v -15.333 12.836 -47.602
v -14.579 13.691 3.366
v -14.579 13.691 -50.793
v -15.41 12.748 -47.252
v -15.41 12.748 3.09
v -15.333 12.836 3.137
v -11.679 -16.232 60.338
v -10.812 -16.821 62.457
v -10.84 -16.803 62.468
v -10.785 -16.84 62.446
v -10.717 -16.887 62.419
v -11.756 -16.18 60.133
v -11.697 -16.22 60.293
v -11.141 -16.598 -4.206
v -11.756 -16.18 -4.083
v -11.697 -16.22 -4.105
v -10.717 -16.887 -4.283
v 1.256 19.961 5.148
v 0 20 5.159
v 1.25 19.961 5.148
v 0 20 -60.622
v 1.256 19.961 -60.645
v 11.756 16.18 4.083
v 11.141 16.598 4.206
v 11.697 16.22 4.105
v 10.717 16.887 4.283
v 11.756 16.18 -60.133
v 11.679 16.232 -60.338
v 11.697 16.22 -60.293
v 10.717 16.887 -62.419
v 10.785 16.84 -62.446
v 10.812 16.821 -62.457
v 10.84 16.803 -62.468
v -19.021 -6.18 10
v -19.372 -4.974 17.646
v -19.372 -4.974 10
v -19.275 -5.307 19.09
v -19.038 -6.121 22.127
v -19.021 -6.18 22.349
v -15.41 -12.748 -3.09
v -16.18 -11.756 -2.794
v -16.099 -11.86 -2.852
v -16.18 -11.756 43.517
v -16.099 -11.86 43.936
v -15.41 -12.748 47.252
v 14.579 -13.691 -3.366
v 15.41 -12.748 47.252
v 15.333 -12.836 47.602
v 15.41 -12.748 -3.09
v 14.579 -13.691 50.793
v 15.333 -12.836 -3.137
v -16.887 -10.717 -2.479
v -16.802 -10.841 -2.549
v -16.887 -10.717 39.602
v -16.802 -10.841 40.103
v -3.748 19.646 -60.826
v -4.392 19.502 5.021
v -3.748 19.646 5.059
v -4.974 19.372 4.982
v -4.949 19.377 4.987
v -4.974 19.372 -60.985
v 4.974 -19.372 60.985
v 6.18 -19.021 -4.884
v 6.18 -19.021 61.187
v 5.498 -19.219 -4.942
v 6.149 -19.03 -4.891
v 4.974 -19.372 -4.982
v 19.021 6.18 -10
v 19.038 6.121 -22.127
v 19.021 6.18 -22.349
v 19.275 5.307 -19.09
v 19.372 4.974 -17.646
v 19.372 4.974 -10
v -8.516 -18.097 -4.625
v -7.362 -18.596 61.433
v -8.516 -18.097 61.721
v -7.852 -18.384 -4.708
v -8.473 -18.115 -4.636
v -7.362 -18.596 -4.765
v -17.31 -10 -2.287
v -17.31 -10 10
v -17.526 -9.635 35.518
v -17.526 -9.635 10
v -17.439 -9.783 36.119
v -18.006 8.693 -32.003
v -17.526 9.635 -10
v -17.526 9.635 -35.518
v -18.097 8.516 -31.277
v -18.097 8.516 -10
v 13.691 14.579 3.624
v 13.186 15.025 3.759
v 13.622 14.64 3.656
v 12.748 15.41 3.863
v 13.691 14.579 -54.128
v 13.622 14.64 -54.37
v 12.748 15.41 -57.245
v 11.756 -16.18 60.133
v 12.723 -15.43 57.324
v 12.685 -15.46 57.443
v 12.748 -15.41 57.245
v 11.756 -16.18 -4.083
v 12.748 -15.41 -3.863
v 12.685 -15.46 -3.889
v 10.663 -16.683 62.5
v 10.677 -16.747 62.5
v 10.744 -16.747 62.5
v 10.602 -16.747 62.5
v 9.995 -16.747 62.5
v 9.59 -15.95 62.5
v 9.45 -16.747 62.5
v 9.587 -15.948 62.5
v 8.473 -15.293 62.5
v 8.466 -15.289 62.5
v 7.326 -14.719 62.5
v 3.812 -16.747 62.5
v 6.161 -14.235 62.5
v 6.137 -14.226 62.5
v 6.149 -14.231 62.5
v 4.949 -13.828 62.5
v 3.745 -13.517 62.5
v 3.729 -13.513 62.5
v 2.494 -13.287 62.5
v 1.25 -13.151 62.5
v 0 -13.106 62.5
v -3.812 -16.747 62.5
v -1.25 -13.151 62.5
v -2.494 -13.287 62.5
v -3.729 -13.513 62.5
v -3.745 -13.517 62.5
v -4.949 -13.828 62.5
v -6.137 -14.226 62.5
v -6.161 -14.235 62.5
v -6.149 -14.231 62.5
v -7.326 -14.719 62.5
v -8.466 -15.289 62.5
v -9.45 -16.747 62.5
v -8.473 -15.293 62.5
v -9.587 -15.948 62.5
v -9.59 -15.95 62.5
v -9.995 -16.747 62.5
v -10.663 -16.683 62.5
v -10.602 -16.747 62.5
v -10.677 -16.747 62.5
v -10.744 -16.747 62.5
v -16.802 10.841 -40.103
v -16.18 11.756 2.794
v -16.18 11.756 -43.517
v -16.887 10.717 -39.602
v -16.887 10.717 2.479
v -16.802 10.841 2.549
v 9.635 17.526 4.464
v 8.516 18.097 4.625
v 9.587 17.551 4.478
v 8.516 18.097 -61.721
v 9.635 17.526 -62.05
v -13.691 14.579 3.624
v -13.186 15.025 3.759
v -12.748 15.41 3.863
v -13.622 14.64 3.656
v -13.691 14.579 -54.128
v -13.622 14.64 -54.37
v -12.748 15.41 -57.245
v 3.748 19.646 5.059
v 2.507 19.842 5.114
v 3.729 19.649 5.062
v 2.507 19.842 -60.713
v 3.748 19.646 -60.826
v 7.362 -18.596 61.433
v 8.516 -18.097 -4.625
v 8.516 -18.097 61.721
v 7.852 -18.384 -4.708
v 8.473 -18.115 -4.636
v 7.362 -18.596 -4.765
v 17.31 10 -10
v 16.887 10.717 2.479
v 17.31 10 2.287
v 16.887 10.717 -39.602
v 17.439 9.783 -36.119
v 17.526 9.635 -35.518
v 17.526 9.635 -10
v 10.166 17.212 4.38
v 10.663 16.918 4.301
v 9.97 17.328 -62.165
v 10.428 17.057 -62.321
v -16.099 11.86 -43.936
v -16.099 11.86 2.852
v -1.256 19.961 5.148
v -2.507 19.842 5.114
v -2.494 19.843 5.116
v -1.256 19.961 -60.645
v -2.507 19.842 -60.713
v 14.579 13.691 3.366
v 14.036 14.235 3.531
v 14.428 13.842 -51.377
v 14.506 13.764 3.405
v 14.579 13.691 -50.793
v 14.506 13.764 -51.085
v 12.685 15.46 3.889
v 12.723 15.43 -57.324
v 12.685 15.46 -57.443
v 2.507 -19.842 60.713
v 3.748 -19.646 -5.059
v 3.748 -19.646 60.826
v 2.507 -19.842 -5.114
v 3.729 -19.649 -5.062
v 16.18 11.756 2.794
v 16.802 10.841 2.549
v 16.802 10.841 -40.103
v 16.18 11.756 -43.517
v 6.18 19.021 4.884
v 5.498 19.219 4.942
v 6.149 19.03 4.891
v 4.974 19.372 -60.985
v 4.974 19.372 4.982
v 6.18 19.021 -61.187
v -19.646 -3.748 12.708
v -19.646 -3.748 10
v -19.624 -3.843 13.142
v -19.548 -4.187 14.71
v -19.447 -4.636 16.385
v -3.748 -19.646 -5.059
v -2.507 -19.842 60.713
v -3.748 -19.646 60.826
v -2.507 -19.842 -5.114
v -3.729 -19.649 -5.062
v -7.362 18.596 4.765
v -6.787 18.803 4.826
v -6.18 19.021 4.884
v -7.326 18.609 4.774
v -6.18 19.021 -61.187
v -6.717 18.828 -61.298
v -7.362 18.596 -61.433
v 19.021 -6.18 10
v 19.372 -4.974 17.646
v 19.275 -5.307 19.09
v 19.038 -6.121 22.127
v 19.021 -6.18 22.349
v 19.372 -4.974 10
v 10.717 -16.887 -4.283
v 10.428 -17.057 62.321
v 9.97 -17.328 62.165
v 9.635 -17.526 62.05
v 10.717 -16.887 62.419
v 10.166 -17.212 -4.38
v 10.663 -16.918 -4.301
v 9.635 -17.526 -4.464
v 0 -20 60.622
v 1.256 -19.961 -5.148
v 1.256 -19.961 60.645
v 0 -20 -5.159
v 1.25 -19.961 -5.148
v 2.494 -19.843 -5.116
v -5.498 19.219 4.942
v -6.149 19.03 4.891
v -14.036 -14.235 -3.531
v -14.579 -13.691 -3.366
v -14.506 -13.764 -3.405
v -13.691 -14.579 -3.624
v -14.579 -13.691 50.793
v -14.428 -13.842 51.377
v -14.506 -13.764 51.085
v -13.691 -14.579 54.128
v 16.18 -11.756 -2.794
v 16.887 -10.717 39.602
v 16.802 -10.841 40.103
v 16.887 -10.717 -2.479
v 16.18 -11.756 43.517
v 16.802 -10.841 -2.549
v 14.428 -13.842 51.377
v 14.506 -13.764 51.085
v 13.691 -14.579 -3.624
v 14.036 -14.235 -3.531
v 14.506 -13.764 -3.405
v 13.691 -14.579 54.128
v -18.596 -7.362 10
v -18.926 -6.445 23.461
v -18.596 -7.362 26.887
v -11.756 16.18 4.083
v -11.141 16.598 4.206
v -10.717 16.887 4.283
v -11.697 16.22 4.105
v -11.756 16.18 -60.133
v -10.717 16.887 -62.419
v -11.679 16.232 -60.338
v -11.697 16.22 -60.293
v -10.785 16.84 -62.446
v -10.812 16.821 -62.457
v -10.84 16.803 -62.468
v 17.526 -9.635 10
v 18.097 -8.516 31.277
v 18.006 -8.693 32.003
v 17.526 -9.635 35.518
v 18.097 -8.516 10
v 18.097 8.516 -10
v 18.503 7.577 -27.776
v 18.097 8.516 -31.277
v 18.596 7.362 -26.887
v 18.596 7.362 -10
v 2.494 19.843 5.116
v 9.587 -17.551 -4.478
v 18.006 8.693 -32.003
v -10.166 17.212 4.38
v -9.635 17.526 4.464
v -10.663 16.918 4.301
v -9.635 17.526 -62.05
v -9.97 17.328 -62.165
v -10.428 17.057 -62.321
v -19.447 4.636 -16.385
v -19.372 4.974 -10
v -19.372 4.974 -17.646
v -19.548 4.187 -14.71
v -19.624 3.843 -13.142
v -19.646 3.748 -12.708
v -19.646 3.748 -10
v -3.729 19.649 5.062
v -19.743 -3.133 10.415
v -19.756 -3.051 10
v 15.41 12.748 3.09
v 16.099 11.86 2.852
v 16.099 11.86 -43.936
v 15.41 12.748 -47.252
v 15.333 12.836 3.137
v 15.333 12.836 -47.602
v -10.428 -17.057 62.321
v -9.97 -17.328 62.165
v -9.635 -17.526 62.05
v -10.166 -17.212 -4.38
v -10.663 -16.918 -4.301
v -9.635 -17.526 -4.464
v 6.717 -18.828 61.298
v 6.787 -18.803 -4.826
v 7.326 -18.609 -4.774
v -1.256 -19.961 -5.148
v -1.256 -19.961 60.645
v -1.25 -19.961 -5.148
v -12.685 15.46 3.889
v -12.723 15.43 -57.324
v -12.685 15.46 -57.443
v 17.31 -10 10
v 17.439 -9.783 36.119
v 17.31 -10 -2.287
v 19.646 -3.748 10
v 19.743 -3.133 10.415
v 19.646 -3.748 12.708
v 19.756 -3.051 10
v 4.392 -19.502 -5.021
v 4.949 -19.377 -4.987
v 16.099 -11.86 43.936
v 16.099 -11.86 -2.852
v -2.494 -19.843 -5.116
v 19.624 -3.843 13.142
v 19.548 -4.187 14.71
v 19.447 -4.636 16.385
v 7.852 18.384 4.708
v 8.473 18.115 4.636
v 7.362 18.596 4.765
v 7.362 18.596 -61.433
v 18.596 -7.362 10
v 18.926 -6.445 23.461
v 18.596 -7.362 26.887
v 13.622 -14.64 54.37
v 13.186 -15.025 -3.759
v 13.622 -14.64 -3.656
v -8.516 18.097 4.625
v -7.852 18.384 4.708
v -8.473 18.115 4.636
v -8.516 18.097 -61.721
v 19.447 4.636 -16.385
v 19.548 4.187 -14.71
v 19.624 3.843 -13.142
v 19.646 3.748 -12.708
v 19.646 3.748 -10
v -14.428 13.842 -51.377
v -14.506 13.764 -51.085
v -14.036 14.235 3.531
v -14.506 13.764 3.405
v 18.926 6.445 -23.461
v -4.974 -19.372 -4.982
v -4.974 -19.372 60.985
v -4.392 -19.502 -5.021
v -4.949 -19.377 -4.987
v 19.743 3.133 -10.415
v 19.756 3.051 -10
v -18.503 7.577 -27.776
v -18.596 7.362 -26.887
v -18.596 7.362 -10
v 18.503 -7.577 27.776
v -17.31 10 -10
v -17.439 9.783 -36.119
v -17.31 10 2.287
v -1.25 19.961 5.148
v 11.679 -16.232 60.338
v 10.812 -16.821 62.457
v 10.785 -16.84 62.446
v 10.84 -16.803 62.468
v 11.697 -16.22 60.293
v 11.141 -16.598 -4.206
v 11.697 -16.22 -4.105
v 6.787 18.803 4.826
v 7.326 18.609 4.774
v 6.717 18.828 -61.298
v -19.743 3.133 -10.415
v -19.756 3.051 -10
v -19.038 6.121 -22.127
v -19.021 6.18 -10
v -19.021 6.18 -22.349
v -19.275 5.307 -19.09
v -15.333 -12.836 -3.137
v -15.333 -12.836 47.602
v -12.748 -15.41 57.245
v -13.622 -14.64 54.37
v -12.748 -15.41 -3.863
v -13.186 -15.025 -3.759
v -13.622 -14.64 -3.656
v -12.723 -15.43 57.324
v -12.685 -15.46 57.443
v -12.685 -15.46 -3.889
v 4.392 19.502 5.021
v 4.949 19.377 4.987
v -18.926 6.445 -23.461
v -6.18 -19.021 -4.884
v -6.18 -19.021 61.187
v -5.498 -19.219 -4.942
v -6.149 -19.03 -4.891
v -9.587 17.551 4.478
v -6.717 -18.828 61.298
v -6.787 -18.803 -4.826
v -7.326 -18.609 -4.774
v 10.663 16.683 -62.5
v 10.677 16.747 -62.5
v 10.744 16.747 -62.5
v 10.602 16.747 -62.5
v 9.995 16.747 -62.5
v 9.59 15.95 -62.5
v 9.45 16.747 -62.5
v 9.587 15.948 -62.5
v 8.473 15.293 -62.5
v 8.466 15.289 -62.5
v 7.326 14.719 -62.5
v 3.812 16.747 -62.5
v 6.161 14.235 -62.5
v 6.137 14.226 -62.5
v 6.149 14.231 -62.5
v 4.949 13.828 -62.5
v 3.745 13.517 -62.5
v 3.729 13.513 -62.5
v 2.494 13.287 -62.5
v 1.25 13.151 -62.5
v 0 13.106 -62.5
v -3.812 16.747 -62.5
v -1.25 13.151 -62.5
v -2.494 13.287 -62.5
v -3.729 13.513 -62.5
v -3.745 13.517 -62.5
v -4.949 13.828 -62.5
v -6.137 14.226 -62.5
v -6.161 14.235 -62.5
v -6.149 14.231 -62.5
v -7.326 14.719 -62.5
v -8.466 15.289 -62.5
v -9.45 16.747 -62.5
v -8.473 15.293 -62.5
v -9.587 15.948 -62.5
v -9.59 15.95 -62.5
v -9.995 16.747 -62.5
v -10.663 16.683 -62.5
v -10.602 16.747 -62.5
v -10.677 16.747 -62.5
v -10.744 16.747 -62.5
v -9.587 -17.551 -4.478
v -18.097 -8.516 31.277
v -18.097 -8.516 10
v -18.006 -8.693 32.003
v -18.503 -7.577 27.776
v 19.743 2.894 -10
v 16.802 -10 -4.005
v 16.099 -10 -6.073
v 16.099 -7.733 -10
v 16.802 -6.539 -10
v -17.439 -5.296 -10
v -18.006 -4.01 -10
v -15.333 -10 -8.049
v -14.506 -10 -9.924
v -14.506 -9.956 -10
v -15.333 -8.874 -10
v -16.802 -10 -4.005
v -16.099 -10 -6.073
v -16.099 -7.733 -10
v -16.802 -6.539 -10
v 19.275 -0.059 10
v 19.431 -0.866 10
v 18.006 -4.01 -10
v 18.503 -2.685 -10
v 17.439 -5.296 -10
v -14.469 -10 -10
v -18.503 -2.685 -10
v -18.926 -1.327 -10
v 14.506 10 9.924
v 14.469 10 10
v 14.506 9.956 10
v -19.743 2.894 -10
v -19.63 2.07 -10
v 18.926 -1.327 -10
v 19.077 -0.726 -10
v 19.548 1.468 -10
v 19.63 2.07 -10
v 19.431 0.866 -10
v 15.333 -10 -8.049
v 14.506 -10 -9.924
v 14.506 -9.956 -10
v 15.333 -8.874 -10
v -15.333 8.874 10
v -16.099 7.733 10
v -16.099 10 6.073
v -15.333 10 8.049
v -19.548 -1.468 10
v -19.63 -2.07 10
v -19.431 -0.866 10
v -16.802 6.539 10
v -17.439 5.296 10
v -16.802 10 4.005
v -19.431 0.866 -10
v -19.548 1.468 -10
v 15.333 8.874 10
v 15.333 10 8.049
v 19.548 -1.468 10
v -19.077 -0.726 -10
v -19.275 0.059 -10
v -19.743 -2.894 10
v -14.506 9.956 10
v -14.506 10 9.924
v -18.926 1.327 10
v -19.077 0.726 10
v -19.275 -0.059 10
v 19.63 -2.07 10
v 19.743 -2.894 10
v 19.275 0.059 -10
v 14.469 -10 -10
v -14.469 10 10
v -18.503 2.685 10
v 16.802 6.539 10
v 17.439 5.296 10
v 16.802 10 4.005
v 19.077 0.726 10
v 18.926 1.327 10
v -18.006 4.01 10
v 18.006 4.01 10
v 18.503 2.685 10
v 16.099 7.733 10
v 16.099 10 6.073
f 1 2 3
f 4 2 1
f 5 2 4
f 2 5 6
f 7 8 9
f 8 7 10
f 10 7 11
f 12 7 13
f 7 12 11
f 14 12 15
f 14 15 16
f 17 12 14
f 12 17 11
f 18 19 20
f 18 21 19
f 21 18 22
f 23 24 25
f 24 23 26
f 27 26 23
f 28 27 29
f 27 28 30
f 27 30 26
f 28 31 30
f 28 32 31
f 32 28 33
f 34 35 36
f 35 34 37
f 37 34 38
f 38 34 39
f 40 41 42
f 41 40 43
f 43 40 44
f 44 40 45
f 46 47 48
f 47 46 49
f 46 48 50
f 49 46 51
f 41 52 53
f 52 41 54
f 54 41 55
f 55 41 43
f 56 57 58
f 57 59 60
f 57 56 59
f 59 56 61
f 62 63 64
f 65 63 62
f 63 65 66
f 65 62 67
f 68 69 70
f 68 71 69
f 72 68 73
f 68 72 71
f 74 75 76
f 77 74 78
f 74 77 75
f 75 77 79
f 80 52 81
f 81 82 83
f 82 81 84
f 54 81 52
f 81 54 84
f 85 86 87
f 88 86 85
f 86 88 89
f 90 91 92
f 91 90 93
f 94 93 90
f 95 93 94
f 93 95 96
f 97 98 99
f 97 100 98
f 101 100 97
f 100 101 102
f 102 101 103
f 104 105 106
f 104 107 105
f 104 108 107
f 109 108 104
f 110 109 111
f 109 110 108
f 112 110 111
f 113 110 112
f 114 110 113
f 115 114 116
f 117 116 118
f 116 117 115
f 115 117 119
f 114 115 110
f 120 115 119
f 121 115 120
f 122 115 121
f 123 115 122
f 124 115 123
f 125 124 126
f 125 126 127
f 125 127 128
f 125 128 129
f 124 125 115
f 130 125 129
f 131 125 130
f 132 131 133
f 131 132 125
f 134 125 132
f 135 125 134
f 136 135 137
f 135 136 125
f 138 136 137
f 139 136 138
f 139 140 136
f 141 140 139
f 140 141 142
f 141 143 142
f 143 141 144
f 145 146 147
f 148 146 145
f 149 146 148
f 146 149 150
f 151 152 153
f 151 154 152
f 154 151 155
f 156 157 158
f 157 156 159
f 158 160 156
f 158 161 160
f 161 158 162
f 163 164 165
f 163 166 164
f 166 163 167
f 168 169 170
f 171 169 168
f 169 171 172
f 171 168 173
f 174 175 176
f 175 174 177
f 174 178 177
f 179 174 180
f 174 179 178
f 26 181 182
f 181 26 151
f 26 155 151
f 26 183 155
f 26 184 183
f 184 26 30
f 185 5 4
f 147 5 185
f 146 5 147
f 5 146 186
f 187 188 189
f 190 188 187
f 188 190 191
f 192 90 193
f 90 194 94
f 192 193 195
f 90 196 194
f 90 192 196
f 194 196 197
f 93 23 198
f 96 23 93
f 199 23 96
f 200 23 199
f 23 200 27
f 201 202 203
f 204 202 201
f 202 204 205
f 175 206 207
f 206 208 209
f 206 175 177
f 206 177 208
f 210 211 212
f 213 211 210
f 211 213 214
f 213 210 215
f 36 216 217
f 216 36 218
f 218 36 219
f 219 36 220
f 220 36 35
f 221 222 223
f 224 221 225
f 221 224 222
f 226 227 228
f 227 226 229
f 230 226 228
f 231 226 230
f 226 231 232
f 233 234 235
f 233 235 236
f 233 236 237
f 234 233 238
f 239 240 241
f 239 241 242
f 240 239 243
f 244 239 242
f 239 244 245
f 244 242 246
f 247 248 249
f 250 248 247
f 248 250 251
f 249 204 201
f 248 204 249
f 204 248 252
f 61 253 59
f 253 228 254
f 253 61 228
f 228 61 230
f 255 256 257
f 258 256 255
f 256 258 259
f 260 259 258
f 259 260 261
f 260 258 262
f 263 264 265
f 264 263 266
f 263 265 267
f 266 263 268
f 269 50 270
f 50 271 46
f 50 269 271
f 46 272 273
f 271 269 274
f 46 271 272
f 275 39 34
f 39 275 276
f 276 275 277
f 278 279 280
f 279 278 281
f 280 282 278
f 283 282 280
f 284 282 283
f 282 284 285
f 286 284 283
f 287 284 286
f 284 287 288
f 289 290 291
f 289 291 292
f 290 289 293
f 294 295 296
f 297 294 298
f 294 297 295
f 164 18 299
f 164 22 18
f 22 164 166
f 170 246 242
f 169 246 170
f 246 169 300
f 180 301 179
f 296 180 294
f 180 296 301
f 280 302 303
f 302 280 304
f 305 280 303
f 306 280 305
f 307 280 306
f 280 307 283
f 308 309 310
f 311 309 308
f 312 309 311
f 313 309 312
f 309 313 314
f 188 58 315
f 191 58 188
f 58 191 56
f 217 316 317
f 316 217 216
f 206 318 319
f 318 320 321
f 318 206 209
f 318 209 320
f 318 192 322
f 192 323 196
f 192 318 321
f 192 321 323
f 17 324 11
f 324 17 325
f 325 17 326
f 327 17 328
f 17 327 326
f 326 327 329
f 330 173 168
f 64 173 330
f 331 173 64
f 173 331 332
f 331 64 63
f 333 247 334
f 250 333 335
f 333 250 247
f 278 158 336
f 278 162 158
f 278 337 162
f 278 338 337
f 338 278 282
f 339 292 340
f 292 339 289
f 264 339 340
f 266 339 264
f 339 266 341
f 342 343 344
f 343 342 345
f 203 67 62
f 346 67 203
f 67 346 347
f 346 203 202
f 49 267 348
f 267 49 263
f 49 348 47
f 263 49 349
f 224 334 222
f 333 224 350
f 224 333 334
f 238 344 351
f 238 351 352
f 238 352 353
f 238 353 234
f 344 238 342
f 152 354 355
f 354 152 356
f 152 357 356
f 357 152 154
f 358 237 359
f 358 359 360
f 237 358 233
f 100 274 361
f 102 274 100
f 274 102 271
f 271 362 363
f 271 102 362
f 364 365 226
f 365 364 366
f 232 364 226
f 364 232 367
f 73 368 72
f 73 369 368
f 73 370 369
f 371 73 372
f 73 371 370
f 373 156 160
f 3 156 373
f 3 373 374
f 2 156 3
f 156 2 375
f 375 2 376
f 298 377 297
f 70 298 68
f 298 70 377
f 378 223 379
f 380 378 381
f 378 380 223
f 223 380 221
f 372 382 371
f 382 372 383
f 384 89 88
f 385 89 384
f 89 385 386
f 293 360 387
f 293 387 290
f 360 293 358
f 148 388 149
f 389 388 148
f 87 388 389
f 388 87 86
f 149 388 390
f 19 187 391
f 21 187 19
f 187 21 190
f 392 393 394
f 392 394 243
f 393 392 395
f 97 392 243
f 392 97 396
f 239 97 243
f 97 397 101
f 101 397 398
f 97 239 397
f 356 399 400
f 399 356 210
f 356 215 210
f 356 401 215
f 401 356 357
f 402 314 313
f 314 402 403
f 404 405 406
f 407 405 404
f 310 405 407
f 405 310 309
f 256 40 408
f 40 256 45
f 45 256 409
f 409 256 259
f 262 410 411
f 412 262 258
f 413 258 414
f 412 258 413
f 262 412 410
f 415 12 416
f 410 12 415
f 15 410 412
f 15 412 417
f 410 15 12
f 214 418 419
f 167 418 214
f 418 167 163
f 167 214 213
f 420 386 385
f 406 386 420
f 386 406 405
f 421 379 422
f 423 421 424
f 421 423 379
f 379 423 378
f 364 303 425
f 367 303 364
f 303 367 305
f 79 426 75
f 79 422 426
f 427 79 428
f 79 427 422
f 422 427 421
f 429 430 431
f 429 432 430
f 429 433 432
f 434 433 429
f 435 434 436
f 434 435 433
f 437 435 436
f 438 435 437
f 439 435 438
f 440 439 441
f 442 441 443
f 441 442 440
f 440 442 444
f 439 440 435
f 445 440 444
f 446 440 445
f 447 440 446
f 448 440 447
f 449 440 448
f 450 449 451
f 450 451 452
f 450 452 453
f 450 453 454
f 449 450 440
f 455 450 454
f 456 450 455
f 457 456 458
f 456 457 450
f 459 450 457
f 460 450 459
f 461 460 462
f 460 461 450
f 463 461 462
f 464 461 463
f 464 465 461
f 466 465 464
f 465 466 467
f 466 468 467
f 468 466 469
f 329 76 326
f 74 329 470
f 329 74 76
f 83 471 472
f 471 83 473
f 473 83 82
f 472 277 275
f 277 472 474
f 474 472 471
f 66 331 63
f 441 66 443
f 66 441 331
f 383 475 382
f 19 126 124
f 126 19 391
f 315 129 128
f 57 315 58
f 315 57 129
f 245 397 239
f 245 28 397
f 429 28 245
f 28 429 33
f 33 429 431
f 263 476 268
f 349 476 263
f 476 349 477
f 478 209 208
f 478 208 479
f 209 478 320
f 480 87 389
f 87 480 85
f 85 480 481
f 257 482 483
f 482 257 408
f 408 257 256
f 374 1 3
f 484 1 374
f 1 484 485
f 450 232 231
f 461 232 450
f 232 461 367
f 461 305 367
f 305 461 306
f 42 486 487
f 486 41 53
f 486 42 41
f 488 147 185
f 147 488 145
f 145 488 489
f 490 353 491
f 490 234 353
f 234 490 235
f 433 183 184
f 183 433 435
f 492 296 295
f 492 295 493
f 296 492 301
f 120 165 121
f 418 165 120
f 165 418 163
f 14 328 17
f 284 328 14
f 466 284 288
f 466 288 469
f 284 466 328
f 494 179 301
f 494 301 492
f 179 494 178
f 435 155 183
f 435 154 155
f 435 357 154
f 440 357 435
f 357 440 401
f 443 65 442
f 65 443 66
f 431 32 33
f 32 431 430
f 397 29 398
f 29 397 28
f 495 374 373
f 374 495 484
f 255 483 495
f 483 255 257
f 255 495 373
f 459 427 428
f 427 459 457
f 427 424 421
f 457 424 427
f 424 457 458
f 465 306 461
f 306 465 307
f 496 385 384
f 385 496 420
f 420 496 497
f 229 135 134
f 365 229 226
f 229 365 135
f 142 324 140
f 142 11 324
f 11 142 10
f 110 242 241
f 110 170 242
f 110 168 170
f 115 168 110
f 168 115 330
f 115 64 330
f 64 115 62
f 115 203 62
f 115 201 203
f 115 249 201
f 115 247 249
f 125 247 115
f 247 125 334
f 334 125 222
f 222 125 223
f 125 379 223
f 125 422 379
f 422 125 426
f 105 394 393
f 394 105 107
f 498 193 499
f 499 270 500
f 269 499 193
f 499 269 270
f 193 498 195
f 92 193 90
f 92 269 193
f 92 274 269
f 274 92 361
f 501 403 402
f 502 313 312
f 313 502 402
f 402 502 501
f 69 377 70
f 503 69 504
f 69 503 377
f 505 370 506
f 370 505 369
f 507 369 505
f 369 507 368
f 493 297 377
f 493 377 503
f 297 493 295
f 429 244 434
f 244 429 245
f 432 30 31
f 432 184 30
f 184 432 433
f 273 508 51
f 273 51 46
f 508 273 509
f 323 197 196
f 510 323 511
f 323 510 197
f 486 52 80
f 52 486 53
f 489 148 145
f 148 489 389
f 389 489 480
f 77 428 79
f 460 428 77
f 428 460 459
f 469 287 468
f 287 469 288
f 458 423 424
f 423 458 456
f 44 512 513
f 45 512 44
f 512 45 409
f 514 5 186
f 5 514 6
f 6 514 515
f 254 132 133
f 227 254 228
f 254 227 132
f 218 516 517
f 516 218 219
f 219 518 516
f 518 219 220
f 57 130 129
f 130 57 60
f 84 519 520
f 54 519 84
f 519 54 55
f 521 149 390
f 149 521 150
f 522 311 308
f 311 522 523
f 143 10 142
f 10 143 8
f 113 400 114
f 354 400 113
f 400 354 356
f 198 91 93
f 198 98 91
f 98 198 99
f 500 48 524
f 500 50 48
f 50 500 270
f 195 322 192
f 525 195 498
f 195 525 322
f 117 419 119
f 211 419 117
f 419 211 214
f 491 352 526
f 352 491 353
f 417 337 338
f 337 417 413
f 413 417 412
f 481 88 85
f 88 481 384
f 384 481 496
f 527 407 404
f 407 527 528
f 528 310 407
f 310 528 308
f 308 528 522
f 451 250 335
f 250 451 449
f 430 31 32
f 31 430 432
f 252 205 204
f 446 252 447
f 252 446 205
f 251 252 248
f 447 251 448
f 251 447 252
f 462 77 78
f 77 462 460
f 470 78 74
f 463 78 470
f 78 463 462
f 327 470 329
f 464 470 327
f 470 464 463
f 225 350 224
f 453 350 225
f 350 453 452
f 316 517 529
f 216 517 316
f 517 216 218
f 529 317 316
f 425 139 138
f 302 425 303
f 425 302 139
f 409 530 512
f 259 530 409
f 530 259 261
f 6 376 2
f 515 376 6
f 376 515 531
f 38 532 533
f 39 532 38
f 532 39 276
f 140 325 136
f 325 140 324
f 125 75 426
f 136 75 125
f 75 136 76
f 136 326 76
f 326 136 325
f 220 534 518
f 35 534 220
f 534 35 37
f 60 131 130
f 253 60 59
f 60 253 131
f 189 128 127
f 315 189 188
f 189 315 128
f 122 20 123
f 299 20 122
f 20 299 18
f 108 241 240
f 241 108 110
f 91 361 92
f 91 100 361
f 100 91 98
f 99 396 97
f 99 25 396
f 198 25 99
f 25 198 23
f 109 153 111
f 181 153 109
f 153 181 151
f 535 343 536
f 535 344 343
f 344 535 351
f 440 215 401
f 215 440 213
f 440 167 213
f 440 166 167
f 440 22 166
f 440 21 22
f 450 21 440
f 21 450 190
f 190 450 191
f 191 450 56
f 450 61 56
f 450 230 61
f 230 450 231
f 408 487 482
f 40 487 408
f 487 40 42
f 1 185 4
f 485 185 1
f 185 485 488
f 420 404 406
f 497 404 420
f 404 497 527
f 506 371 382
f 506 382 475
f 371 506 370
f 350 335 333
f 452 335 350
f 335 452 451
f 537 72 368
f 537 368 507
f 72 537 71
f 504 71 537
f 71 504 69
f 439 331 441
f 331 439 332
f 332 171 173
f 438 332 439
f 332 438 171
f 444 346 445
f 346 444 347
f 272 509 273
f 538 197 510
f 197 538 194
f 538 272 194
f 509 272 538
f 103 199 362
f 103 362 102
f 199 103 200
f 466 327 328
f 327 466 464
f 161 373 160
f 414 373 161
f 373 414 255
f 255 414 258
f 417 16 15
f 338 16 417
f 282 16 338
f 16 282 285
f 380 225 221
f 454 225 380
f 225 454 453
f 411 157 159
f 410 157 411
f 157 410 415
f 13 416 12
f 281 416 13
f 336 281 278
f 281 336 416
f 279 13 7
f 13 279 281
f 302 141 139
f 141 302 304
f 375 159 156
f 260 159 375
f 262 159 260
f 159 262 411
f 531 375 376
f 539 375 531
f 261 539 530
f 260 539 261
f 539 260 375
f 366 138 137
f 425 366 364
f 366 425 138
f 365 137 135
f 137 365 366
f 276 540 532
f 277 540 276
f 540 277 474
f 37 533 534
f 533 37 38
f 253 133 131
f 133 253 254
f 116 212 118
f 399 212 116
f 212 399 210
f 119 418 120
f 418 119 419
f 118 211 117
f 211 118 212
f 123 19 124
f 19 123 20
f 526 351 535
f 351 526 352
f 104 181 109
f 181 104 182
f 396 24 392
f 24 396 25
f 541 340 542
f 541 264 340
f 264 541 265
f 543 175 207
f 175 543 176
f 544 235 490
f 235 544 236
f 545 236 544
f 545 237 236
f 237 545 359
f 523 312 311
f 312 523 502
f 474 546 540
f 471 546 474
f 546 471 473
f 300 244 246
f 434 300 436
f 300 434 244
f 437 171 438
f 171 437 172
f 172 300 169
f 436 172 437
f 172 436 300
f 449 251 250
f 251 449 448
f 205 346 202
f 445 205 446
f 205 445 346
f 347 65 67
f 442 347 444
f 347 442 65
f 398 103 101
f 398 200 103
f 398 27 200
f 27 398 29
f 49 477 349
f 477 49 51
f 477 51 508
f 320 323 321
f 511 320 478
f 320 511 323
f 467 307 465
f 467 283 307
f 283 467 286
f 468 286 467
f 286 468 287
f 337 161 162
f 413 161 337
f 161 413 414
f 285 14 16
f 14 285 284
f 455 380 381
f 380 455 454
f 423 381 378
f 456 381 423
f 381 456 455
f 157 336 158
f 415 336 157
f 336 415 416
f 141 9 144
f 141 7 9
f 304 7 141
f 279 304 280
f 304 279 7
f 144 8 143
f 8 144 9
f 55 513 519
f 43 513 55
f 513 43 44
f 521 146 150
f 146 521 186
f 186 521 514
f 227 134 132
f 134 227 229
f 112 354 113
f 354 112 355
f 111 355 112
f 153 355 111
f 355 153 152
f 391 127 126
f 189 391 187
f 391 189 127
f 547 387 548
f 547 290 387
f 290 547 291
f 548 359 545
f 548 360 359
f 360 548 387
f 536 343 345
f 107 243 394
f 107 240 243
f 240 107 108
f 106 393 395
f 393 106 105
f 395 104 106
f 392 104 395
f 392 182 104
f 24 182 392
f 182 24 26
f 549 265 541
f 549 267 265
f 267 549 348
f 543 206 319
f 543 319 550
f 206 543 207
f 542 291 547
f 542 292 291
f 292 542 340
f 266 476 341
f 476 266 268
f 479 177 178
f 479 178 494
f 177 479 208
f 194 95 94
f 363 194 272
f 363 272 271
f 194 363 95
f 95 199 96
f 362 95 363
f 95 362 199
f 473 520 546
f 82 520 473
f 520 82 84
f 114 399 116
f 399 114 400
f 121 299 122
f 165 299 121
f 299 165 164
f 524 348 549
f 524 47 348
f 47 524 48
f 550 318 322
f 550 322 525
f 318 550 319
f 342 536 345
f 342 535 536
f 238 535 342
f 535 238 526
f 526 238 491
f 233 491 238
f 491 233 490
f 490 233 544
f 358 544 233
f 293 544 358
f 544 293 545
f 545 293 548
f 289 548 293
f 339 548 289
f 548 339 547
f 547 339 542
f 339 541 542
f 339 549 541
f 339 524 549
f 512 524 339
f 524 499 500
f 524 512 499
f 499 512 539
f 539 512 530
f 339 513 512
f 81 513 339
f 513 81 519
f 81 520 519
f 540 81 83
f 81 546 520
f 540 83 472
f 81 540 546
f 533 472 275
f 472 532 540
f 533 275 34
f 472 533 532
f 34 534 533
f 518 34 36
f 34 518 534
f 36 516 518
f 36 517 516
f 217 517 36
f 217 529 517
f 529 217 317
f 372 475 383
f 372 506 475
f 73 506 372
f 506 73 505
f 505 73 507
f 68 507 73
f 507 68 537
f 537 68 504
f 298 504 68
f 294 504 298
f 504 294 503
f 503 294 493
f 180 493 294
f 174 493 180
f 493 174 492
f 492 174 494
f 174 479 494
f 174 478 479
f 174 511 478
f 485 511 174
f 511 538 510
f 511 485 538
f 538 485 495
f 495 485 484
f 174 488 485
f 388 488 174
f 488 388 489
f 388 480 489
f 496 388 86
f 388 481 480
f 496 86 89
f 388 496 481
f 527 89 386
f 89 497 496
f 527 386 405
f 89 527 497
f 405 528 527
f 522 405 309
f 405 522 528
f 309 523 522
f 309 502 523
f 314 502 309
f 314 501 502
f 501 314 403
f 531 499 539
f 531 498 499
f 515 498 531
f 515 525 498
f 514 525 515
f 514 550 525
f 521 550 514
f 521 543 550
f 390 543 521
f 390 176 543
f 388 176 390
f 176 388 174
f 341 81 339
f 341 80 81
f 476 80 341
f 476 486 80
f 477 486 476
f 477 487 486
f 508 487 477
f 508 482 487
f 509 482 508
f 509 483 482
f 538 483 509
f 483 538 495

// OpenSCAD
difference(){

intersection() {
        cylinder (h = 125, r=20, center = true, $fn=100);
        rotate ([30,0,0]) cylinder (h = 125, r=19.9, center = true, $fn=100);
};



translate([0,0,0]){
color([1,0,0]) cube([70, 20,20],center=true,$fn=100);}
}
